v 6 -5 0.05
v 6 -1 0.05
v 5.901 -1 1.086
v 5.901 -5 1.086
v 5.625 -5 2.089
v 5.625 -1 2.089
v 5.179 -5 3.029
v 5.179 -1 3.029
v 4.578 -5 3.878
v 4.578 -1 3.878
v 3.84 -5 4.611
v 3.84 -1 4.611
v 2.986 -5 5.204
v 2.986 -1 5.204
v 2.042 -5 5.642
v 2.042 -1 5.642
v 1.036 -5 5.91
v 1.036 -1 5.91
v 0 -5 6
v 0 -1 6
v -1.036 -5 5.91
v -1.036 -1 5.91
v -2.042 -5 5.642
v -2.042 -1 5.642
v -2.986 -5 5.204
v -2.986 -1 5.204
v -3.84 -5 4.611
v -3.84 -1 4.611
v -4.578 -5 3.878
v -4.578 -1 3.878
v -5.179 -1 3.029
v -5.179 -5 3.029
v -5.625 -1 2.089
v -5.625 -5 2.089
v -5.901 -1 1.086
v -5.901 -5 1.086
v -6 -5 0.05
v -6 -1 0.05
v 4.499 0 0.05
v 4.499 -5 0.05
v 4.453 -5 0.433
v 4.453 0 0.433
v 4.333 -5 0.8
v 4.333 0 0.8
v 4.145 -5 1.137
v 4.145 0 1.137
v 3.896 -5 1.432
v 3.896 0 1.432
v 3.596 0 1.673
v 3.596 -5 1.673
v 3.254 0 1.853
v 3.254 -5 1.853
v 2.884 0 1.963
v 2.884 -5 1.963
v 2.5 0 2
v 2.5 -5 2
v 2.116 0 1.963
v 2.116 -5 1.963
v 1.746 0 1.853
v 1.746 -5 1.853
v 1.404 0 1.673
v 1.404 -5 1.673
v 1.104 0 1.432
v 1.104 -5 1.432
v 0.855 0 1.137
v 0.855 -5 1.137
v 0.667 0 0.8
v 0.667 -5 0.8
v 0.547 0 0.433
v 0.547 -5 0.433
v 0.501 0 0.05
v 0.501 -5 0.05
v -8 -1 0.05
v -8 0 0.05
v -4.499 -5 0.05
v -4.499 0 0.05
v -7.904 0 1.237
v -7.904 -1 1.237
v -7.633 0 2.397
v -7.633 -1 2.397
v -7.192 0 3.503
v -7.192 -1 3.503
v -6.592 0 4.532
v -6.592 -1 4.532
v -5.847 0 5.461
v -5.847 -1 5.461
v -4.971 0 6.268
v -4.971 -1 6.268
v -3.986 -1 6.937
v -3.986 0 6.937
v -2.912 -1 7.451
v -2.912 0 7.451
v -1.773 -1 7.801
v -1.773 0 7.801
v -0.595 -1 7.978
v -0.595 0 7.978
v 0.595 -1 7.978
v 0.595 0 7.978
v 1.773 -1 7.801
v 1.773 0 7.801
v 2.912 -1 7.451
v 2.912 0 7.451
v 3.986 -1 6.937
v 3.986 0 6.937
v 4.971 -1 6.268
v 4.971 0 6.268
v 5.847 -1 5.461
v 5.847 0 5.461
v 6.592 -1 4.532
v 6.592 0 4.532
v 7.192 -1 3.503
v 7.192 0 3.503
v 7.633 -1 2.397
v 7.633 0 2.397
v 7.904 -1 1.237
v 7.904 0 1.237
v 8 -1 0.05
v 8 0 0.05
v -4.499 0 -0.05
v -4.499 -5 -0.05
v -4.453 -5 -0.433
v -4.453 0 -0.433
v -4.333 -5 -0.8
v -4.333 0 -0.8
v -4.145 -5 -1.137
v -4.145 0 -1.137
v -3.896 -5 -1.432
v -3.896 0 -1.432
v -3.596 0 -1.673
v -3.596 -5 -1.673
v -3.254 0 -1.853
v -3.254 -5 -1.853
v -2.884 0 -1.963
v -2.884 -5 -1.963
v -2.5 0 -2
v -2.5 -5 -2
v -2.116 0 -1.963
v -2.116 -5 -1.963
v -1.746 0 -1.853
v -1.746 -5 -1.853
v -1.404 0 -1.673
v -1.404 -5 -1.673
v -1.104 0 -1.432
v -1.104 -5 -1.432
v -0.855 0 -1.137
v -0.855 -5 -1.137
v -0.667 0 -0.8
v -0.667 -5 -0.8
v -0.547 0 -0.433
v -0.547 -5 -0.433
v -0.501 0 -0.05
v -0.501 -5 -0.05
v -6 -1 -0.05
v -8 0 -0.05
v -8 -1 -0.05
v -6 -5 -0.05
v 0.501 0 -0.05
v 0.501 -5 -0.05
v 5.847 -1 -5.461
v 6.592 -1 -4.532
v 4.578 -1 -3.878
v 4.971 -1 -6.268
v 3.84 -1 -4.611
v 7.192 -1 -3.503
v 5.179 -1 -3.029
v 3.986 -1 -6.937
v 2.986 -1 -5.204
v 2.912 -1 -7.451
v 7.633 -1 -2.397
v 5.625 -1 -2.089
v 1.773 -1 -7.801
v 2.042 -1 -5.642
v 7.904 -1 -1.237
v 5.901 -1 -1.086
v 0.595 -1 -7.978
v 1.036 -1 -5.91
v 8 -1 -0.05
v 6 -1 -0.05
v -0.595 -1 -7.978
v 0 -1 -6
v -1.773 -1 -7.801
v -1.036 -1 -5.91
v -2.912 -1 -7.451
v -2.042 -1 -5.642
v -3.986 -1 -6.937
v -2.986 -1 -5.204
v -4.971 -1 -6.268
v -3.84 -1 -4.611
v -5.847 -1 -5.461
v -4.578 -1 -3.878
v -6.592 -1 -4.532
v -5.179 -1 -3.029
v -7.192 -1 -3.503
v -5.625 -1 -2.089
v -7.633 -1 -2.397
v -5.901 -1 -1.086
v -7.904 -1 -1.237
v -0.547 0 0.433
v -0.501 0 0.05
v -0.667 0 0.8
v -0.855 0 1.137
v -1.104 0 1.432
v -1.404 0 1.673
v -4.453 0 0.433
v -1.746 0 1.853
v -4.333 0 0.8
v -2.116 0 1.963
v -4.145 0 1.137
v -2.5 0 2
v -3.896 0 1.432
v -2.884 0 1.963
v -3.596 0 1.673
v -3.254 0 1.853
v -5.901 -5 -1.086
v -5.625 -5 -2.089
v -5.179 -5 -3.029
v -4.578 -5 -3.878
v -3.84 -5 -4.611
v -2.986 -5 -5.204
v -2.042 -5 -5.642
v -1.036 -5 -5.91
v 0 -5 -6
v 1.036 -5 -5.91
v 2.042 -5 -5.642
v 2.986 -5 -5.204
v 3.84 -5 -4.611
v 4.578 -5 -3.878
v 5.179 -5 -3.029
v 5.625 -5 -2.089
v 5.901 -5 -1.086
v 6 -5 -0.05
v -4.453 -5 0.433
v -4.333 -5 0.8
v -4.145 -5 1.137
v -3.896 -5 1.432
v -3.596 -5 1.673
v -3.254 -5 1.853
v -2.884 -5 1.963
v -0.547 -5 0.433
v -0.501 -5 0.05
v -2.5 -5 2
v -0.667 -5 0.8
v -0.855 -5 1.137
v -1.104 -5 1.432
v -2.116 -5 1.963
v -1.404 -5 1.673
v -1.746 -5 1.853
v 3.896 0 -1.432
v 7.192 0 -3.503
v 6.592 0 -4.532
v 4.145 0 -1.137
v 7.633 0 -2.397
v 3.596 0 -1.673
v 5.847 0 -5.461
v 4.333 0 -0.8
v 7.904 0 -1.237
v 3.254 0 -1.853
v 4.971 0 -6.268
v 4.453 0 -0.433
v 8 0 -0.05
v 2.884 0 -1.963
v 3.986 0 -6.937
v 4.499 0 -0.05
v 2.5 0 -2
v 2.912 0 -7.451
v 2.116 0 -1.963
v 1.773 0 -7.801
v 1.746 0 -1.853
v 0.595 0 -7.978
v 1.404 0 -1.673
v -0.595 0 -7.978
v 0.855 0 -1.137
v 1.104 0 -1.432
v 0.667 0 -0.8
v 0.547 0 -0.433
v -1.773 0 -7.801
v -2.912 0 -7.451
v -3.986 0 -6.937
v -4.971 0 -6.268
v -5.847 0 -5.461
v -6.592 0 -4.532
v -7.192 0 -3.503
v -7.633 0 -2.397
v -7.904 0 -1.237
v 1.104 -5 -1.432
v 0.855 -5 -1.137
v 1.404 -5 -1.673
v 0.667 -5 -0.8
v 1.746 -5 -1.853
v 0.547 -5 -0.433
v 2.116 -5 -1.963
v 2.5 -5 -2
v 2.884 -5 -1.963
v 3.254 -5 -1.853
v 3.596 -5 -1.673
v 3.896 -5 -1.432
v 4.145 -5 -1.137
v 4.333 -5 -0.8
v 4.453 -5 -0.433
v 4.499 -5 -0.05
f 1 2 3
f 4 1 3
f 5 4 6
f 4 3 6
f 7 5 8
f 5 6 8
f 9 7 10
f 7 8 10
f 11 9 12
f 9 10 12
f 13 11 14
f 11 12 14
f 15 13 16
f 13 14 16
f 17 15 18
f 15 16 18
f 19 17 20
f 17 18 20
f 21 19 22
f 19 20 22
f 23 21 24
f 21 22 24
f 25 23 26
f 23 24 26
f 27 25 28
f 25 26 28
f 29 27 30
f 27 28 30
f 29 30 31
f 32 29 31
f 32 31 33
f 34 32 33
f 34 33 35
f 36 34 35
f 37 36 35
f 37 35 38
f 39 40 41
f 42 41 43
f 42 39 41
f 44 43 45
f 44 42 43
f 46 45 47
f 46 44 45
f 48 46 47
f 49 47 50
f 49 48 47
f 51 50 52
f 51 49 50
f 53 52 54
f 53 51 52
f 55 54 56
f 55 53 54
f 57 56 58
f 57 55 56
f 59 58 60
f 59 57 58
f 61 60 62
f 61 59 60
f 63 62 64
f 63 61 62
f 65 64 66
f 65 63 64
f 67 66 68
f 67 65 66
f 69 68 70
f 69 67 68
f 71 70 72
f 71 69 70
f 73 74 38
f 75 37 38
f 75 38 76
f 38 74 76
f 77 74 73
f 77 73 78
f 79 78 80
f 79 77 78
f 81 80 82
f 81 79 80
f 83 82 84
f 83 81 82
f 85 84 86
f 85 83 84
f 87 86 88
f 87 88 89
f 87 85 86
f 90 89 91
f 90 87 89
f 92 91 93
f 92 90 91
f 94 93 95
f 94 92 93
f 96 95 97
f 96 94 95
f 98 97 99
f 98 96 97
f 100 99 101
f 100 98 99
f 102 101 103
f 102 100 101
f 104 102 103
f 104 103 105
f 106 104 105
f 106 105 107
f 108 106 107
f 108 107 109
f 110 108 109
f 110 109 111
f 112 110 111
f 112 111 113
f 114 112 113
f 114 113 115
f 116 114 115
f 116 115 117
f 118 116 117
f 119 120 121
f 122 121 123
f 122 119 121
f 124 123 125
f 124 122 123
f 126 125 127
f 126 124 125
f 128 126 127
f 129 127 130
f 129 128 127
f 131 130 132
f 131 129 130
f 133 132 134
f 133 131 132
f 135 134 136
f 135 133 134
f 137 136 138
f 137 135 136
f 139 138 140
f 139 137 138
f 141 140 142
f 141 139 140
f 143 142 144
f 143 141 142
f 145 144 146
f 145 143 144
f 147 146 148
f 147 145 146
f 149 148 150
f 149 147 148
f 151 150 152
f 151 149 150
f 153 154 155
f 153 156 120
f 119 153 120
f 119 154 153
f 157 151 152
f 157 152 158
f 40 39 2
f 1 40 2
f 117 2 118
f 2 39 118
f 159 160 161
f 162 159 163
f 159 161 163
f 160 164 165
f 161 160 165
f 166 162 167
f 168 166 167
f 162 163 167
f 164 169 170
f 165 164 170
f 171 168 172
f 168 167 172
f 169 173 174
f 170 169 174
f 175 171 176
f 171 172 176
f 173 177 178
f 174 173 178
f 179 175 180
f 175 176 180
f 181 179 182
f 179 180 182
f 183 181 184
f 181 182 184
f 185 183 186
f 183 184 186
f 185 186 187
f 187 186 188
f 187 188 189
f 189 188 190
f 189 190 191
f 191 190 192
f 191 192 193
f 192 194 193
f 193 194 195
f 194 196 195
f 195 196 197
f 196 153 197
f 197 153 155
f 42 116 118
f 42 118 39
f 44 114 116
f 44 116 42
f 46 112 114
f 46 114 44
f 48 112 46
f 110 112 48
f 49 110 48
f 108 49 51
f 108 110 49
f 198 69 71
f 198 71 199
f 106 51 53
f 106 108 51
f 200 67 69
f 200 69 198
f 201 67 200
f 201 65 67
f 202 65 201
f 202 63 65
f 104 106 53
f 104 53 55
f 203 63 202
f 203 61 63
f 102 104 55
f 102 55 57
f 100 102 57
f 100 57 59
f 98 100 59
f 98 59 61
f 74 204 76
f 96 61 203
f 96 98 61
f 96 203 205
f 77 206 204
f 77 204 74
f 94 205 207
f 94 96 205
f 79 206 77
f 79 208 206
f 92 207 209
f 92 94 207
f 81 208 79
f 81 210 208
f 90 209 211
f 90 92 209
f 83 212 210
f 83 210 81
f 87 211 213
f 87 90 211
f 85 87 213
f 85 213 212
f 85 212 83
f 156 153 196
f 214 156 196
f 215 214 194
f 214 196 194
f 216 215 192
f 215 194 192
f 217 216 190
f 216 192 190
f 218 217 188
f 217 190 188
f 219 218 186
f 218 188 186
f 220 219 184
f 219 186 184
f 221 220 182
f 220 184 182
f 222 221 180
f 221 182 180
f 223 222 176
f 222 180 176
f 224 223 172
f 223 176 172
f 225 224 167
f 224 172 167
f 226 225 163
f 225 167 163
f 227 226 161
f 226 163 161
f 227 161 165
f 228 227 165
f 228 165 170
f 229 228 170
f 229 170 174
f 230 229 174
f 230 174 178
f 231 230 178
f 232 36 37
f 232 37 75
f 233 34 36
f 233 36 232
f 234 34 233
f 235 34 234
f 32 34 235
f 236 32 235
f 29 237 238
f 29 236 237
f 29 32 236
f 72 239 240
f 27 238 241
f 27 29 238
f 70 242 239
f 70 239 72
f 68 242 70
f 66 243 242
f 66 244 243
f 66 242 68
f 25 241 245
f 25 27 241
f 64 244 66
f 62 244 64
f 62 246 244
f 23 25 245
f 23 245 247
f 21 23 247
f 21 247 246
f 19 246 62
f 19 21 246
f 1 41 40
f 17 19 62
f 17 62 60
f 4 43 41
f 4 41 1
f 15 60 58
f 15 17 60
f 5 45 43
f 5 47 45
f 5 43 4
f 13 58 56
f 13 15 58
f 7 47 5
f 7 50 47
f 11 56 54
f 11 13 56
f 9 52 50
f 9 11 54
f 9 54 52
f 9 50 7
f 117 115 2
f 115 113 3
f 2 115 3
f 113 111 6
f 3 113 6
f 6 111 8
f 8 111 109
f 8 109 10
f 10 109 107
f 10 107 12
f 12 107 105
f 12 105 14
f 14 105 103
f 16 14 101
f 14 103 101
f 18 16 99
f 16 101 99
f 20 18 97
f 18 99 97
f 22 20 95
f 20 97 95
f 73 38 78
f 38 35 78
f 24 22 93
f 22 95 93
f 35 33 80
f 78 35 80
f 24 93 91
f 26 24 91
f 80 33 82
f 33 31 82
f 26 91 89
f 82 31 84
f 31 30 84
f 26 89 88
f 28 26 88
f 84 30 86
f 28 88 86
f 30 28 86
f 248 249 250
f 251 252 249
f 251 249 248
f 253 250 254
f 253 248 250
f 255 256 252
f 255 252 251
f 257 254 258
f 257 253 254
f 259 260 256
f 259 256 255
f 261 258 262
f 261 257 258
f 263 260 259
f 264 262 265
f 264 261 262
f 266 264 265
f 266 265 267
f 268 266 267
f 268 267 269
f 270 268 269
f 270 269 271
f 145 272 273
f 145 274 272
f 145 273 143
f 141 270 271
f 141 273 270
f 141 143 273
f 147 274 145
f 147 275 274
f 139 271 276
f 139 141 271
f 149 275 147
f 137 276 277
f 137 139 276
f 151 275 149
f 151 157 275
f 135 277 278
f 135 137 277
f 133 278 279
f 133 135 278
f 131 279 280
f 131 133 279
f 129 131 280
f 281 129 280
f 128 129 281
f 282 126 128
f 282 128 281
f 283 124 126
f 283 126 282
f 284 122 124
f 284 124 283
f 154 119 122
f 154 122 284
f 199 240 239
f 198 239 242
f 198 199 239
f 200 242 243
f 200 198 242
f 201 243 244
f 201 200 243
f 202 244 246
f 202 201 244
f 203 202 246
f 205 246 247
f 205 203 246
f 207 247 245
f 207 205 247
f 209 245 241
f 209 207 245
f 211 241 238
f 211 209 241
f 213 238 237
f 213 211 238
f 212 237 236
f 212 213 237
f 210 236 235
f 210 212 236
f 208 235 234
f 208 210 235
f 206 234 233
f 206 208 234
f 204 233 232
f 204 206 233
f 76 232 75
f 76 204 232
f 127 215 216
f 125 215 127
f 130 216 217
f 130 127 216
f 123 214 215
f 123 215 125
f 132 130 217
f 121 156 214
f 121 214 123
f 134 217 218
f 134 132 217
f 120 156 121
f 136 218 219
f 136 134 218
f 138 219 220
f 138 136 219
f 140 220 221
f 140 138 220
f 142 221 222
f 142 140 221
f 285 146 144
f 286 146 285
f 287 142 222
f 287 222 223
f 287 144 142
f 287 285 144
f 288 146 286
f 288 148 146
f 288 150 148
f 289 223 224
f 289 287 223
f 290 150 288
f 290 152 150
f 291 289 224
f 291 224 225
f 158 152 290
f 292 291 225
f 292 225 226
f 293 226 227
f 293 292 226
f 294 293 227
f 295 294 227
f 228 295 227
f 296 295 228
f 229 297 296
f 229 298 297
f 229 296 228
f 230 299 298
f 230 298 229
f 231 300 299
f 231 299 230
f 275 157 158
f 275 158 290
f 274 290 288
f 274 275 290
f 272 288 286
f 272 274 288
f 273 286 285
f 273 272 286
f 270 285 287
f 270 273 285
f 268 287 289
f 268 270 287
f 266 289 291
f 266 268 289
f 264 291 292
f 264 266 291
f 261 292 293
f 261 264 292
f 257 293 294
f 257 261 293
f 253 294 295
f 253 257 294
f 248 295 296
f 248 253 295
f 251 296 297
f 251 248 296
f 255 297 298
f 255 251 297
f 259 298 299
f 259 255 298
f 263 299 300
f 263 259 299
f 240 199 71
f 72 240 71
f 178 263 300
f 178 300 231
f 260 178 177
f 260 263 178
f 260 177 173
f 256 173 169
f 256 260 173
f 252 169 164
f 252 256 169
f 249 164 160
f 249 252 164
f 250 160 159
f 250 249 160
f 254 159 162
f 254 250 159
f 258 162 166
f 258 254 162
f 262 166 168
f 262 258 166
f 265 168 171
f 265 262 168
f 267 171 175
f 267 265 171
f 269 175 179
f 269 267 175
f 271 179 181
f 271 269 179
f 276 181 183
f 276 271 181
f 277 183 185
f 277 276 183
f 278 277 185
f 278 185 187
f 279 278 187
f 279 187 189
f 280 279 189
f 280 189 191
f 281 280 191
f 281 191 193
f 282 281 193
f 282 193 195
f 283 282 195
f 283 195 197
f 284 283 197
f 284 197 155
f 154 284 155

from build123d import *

# Parameters (mm, degrees)
F0_R          = 6
F0_R_2        = 2
F1_DEPTH      = 5
F2_R          = 8
F2_R_2        = 6
F3_DEPTH      = 1
F4_W          = 30
F4_H          = 0.1
F5_DEPTH      = 26
F5_DEPTH_BACK = 5.001


# Not quite as in the source:
# - an extrude ends at something that could not be found from the text; its depth is read off the source's solid


with BuildPart() as f1:
    # F0 (on Front) → F1 (new body)
    with BuildSketch(Plane.XZ):
        Circle(F0_R)
        with Locations((-2.5, 0)):
            Circle(F0_R_2, mode=Mode.SUBTRACT)
        with Locations((2.5, 0)):
            Circle(F0_R_2, mode=Mode.SUBTRACT)
    extrude(amount=F1_DEPTH)

    # F2 (on face) → F3 (join)
    with BuildSketch(Plane(origin=(0, 0, 0), x_dir=(-1, 0, 0), z_dir=(0, 1, 0))):
        Circle(F2_R)
        Circle(F2_R_2, mode=Mode.SUBTRACT)
    extrude(amount=-F3_DEPTH)

    # F4 (on Front) → F5 (cut, two sides)
    with BuildSketch(Plane.XZ) as f5_sk:
        with Locations((0.0164873028, 0)):
            Rectangle(F4_W, F4_H)
    extrude(amount=-F5_DEPTH, mode=Mode.SUBTRACT)
    extrude(f5_sk.sketch, amount=F5_DEPTH_BACK, mode=Mode.SUBTRACT)


solid = f1.part
